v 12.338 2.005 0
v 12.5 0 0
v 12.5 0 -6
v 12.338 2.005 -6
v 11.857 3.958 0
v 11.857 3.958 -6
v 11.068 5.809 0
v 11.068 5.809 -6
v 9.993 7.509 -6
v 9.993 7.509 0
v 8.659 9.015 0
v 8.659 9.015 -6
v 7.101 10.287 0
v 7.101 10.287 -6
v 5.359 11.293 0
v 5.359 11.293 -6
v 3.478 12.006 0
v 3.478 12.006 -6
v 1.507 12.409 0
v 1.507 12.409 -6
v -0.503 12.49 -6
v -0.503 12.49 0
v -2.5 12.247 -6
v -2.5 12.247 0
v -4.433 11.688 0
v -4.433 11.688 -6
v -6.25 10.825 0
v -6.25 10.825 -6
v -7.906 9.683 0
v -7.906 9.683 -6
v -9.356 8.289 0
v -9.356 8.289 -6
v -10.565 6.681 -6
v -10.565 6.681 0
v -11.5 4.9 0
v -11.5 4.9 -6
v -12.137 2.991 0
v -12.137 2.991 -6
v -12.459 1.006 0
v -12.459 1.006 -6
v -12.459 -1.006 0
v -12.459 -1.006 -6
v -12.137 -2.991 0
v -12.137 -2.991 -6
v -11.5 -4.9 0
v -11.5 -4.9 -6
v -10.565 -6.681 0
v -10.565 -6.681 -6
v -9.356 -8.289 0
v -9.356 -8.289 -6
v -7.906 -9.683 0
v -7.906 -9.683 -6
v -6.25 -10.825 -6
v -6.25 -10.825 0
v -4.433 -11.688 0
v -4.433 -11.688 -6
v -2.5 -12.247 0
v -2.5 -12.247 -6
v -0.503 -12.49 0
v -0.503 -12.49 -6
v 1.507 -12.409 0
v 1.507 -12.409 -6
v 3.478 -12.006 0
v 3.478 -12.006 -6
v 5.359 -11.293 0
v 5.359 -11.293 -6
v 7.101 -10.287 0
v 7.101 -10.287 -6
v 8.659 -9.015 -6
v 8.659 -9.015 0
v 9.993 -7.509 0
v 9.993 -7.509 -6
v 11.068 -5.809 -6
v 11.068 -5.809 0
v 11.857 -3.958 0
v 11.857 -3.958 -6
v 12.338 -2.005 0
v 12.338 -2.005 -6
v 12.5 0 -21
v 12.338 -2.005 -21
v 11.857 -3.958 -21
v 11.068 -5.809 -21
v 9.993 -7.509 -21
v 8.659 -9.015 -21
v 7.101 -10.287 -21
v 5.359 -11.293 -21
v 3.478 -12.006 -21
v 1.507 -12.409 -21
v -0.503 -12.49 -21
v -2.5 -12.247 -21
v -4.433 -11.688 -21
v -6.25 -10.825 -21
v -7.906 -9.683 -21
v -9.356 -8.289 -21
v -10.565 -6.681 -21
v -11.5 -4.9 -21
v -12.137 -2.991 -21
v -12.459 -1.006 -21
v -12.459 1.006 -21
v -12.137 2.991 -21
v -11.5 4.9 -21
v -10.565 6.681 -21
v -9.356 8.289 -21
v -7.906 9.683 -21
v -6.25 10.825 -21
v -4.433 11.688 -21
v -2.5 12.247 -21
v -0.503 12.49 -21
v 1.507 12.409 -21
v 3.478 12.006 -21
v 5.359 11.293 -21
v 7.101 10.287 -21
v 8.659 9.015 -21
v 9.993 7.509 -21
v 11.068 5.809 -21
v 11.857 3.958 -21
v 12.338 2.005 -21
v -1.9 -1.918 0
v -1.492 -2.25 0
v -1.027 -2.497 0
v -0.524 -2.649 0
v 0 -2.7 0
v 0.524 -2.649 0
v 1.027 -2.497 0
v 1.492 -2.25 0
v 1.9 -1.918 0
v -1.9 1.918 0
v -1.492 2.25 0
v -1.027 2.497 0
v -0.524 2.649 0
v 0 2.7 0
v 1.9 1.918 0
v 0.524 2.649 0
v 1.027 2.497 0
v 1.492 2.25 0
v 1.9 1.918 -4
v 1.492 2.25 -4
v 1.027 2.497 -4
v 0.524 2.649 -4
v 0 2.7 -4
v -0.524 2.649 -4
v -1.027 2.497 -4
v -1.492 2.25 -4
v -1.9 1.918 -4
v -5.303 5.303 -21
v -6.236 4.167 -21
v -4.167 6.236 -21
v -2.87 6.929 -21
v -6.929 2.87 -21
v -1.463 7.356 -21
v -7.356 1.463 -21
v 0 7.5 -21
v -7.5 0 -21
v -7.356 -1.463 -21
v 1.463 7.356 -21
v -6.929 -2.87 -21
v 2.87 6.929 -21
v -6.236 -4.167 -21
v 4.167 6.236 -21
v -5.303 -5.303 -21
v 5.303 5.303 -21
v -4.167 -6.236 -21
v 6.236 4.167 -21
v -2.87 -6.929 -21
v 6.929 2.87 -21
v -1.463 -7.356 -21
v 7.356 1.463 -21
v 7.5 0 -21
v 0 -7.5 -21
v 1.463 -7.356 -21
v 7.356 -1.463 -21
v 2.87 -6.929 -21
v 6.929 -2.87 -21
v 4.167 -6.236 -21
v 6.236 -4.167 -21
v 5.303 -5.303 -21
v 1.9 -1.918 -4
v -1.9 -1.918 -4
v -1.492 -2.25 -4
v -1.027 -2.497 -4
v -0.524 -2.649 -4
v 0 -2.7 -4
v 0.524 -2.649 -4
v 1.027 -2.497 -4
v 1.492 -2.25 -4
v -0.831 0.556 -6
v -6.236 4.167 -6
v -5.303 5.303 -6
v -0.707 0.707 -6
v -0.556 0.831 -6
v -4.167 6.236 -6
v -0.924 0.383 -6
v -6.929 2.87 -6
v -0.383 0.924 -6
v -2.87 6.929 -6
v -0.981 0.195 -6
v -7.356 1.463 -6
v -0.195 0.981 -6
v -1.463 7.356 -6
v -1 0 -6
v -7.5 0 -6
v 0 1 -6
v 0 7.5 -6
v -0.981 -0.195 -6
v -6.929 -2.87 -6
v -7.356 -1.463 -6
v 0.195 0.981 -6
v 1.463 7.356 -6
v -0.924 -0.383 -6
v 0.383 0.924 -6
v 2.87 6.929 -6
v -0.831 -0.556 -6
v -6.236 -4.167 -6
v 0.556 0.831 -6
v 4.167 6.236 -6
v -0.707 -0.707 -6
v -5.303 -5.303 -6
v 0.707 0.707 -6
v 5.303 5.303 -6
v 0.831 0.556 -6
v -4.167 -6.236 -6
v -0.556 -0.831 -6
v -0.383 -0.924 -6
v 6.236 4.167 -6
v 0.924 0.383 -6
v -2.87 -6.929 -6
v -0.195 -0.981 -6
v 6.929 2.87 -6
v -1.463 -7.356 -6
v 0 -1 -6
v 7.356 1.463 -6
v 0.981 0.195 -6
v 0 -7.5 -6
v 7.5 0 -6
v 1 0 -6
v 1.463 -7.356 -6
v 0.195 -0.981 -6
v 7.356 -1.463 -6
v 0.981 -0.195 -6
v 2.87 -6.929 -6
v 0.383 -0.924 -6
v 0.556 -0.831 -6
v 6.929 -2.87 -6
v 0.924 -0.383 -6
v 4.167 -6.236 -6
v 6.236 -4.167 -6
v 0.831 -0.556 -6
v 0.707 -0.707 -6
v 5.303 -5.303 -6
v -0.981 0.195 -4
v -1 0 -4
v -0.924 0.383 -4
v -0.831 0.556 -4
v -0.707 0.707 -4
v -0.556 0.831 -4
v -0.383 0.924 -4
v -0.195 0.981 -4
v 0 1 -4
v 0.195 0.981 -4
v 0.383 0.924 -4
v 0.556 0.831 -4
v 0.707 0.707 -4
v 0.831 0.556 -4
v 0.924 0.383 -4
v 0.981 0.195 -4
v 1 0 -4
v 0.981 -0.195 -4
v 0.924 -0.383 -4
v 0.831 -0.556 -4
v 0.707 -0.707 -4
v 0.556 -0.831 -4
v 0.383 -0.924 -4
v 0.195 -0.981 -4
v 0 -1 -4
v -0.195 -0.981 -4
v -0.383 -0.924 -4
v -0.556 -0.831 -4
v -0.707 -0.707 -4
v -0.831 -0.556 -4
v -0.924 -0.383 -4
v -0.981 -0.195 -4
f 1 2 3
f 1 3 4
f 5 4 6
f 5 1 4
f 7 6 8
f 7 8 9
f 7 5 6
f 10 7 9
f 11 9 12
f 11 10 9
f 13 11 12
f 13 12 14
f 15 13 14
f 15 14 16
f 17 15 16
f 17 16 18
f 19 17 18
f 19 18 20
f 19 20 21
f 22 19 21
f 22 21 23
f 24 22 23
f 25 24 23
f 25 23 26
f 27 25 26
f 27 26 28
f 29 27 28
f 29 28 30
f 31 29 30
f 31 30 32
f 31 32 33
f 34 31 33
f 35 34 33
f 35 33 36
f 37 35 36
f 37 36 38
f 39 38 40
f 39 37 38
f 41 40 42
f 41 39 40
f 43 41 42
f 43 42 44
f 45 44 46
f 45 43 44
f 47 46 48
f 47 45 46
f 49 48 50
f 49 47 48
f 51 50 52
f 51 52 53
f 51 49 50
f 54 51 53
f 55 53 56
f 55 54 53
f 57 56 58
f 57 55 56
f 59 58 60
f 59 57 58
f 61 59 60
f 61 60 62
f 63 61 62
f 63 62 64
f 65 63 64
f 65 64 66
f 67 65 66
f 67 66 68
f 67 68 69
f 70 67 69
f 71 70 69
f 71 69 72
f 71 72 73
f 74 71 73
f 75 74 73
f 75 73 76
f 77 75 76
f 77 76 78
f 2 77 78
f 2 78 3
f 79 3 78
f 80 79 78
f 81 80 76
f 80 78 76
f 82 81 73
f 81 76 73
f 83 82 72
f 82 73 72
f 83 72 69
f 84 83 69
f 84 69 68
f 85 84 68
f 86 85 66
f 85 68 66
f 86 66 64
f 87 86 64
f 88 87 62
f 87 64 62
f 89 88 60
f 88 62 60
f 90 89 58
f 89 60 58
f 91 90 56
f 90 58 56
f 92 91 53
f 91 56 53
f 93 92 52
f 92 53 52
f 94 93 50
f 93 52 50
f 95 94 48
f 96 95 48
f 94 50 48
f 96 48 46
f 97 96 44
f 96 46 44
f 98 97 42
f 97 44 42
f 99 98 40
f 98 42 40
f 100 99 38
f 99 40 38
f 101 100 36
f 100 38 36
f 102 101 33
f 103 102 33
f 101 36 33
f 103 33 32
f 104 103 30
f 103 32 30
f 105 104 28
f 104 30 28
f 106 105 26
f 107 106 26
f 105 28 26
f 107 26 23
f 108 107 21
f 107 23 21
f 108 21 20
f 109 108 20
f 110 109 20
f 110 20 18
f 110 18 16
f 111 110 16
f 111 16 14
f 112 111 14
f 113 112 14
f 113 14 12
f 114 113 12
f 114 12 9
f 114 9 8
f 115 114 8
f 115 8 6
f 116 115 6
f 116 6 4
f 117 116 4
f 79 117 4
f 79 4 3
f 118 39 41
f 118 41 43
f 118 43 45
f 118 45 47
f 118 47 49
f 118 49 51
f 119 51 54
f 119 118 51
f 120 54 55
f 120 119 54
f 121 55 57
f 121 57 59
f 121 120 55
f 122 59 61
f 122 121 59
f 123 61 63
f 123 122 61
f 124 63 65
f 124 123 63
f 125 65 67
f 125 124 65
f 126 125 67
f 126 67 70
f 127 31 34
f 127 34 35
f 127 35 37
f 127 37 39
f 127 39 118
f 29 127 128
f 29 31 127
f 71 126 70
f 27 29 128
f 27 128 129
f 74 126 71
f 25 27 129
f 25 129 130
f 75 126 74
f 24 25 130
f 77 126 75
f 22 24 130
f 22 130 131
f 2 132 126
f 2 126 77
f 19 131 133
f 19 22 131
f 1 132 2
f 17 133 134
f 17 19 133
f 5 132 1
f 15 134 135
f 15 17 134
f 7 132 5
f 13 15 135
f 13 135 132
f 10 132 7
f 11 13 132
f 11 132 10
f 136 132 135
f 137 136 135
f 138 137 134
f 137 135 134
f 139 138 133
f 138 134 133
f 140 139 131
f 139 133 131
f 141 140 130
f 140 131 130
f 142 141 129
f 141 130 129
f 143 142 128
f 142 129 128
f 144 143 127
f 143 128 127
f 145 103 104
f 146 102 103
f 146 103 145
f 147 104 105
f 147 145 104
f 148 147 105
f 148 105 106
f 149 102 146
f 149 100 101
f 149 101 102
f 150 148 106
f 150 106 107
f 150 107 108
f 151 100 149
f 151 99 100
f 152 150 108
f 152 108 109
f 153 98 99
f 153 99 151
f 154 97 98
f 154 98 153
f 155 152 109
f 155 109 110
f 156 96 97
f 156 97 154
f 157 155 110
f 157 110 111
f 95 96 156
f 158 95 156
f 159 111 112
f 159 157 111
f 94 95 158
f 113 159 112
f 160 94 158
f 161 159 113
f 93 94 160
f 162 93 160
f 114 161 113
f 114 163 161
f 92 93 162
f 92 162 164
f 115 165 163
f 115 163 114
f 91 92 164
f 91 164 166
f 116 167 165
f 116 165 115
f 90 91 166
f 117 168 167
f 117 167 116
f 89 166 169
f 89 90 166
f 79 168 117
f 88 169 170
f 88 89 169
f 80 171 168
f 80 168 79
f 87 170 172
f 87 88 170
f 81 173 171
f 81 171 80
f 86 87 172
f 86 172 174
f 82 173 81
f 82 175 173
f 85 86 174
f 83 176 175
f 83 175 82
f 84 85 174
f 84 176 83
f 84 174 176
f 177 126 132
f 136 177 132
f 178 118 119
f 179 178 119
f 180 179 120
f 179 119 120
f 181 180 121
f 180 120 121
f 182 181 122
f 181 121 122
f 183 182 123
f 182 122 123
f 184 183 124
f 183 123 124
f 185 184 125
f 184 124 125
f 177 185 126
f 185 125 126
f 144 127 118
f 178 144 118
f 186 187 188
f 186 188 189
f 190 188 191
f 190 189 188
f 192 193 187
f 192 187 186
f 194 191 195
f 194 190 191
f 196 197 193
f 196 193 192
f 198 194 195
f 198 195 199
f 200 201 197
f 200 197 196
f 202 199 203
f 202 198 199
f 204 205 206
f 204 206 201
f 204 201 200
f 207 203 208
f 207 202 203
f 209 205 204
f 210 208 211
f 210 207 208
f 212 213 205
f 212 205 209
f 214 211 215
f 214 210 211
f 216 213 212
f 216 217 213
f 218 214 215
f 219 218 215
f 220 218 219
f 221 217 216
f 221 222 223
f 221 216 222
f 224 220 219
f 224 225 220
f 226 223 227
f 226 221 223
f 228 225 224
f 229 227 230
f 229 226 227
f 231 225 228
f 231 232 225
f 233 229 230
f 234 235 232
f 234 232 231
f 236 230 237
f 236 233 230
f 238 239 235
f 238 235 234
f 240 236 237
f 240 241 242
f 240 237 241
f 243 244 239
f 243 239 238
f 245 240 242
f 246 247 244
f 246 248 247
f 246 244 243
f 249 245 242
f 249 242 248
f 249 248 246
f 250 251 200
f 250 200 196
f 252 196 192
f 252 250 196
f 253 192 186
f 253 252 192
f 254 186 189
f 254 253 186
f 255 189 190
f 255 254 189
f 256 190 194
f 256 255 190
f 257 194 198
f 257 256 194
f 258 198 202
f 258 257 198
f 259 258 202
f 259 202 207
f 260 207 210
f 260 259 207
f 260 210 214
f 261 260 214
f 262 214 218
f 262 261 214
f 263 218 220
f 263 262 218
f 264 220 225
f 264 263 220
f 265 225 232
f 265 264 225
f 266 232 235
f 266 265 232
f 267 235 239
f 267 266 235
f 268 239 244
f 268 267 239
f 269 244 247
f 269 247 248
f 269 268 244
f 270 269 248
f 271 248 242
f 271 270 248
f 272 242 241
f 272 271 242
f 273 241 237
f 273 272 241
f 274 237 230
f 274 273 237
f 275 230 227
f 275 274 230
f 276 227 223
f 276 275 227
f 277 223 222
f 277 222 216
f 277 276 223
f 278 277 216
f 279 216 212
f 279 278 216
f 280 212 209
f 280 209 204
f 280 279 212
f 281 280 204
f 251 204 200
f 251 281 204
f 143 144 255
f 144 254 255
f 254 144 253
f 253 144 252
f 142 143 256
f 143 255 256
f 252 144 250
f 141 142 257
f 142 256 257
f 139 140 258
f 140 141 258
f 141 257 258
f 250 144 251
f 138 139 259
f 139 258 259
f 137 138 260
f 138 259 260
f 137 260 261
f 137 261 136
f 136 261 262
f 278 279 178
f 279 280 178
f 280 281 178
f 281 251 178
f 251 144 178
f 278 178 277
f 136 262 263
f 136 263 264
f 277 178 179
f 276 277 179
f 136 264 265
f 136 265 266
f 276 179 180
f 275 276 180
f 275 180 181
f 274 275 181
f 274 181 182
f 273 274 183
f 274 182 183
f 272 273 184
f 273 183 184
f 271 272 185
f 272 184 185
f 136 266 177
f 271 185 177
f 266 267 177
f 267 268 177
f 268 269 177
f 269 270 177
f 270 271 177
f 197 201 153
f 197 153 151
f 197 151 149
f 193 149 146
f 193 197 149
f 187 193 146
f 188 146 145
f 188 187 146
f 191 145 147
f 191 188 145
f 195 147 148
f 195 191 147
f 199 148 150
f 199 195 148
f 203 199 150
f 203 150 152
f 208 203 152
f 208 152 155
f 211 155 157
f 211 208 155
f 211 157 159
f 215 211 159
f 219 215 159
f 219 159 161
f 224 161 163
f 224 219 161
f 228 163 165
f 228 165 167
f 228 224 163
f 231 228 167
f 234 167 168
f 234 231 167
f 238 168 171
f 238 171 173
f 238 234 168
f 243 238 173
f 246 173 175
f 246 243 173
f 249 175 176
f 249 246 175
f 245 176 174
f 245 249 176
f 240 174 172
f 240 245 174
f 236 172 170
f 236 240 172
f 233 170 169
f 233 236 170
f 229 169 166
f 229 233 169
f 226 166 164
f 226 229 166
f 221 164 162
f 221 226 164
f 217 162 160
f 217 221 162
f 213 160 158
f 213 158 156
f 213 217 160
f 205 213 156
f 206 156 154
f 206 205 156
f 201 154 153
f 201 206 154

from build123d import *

# Parameters (mm, degrees)
SKETCH2_R           = 25
BOSS_EXTRUDE1_DEPTH = 4
SKETCH3_R           = 25
SKETCH3_R_2         = 1
BOSS_EXTRUDE2_DEPTH = 2
CUT_EXTRUDE1_DEPTH  = 36.860842154
CIRPATTERN1_COUNT   = 30
SKETCH6_R           = 25
SKETCH6_R_2         = 12.5
CUT_EXTRUDE2_DEPTH  = 36.860842154
SKETCH7_R           = 12.5
SKETCH7_R_2         = 7.5
BOSS_EXTRUDE3_DEPTH = 15


with BuildPart() as part:
    # Sketch2 → Boss-Extrude1 (new body)
    with BuildSketch(Plane.XY):
        Circle(SKETCH2_R)
        with BuildLine():
            Line((1.9, -1.918332609), (1.9, 1.918332609))
            ThreePointArc((1.9, 1.918332609), (0, 2.7), (-1.9, 1.918332609))
            Line((-1.9, 1.918332609), (-1.9, -1.918332609))
            ThreePointArc((-1.9, -1.918332609), (0, -2.7), (1.9, -1.918332609))
        make_face(mode=Mode.SUBTRACT)
    extrude(amount=-BOSS_EXTRUDE1_DEPTH)

    # Sketch3 → Boss-Extrude2 (add)
    with BuildSketch(Plane(origin=(0, 0, -4), x_dir=(-1, 0, 0), z_dir=(0, 0, -1))):
        with Locations(Location((0, 0, 0), (0, 0, 180))):
            Circle(SKETCH3_R)
        Circle(SKETCH3_R_2, mode=Mode.SUBTRACT)
    extrude(amount=BOSS_EXTRUDE2_DEPTH)

    # Sketch4 → Cut-Extrude1 (cut, symmetric)
    with BuildSketch(Plane.XY):
        with BuildLine():
            Line((-0.857142857, 18), (0.857142857, 18))
            Line((0.857142857, 18), (0.998868138, 20.976230892))
            ThreePointArc((0.998868138, 20.976230892), (0, 21), (-0.998868138, 20.976230892))
            Line((-0.998868138, 20.976230892), (-0.857142857, 18))
        make_face()
    cut_extrude1 = extrude(amount=CUT_EXTRUDE1_DEPTH, both=True, mode=Mode.SUBTRACT)

    # CirPattern1: Cut-Extrude1 ×30 about axis
    cirpattern1_axis = Axis((0, 0, 0), (0, 0, 1))
    for i in range(1, CIRPATTERN1_COUNT):
        add(cut_extrude1.rotate(cirpattern1_axis, i * 360 / CIRPATTERN1_COUNT), mode=Mode.SUBTRACT)

    # Sketch6 → Cut-Extrude2 (cut, through all)
    with BuildSketch(Plane.XY):
        Circle(SKETCH6_R)
        Circle(SKETCH6_R_2, mode=Mode.SUBTRACT)
    extrude(amount=-CUT_EXTRUDE2_DEPTH, mode=Mode.SUBTRACT)

    # Sketch7 → Boss-Extrude3 (add)
    with BuildSketch(Plane(origin=(0, 0, -6), x_dir=(-1, 0, 0), z_dir=(0, 0, -1))):
        with Locations(Location((0, 0, 0), (0, 0, 180))):
            Circle(SKETCH7_R)
        Circle(SKETCH7_R_2, mode=Mode.SUBTRACT)
    extrude(amount=BOSS_EXTRUDE3_DEPTH)


solid = part.part
